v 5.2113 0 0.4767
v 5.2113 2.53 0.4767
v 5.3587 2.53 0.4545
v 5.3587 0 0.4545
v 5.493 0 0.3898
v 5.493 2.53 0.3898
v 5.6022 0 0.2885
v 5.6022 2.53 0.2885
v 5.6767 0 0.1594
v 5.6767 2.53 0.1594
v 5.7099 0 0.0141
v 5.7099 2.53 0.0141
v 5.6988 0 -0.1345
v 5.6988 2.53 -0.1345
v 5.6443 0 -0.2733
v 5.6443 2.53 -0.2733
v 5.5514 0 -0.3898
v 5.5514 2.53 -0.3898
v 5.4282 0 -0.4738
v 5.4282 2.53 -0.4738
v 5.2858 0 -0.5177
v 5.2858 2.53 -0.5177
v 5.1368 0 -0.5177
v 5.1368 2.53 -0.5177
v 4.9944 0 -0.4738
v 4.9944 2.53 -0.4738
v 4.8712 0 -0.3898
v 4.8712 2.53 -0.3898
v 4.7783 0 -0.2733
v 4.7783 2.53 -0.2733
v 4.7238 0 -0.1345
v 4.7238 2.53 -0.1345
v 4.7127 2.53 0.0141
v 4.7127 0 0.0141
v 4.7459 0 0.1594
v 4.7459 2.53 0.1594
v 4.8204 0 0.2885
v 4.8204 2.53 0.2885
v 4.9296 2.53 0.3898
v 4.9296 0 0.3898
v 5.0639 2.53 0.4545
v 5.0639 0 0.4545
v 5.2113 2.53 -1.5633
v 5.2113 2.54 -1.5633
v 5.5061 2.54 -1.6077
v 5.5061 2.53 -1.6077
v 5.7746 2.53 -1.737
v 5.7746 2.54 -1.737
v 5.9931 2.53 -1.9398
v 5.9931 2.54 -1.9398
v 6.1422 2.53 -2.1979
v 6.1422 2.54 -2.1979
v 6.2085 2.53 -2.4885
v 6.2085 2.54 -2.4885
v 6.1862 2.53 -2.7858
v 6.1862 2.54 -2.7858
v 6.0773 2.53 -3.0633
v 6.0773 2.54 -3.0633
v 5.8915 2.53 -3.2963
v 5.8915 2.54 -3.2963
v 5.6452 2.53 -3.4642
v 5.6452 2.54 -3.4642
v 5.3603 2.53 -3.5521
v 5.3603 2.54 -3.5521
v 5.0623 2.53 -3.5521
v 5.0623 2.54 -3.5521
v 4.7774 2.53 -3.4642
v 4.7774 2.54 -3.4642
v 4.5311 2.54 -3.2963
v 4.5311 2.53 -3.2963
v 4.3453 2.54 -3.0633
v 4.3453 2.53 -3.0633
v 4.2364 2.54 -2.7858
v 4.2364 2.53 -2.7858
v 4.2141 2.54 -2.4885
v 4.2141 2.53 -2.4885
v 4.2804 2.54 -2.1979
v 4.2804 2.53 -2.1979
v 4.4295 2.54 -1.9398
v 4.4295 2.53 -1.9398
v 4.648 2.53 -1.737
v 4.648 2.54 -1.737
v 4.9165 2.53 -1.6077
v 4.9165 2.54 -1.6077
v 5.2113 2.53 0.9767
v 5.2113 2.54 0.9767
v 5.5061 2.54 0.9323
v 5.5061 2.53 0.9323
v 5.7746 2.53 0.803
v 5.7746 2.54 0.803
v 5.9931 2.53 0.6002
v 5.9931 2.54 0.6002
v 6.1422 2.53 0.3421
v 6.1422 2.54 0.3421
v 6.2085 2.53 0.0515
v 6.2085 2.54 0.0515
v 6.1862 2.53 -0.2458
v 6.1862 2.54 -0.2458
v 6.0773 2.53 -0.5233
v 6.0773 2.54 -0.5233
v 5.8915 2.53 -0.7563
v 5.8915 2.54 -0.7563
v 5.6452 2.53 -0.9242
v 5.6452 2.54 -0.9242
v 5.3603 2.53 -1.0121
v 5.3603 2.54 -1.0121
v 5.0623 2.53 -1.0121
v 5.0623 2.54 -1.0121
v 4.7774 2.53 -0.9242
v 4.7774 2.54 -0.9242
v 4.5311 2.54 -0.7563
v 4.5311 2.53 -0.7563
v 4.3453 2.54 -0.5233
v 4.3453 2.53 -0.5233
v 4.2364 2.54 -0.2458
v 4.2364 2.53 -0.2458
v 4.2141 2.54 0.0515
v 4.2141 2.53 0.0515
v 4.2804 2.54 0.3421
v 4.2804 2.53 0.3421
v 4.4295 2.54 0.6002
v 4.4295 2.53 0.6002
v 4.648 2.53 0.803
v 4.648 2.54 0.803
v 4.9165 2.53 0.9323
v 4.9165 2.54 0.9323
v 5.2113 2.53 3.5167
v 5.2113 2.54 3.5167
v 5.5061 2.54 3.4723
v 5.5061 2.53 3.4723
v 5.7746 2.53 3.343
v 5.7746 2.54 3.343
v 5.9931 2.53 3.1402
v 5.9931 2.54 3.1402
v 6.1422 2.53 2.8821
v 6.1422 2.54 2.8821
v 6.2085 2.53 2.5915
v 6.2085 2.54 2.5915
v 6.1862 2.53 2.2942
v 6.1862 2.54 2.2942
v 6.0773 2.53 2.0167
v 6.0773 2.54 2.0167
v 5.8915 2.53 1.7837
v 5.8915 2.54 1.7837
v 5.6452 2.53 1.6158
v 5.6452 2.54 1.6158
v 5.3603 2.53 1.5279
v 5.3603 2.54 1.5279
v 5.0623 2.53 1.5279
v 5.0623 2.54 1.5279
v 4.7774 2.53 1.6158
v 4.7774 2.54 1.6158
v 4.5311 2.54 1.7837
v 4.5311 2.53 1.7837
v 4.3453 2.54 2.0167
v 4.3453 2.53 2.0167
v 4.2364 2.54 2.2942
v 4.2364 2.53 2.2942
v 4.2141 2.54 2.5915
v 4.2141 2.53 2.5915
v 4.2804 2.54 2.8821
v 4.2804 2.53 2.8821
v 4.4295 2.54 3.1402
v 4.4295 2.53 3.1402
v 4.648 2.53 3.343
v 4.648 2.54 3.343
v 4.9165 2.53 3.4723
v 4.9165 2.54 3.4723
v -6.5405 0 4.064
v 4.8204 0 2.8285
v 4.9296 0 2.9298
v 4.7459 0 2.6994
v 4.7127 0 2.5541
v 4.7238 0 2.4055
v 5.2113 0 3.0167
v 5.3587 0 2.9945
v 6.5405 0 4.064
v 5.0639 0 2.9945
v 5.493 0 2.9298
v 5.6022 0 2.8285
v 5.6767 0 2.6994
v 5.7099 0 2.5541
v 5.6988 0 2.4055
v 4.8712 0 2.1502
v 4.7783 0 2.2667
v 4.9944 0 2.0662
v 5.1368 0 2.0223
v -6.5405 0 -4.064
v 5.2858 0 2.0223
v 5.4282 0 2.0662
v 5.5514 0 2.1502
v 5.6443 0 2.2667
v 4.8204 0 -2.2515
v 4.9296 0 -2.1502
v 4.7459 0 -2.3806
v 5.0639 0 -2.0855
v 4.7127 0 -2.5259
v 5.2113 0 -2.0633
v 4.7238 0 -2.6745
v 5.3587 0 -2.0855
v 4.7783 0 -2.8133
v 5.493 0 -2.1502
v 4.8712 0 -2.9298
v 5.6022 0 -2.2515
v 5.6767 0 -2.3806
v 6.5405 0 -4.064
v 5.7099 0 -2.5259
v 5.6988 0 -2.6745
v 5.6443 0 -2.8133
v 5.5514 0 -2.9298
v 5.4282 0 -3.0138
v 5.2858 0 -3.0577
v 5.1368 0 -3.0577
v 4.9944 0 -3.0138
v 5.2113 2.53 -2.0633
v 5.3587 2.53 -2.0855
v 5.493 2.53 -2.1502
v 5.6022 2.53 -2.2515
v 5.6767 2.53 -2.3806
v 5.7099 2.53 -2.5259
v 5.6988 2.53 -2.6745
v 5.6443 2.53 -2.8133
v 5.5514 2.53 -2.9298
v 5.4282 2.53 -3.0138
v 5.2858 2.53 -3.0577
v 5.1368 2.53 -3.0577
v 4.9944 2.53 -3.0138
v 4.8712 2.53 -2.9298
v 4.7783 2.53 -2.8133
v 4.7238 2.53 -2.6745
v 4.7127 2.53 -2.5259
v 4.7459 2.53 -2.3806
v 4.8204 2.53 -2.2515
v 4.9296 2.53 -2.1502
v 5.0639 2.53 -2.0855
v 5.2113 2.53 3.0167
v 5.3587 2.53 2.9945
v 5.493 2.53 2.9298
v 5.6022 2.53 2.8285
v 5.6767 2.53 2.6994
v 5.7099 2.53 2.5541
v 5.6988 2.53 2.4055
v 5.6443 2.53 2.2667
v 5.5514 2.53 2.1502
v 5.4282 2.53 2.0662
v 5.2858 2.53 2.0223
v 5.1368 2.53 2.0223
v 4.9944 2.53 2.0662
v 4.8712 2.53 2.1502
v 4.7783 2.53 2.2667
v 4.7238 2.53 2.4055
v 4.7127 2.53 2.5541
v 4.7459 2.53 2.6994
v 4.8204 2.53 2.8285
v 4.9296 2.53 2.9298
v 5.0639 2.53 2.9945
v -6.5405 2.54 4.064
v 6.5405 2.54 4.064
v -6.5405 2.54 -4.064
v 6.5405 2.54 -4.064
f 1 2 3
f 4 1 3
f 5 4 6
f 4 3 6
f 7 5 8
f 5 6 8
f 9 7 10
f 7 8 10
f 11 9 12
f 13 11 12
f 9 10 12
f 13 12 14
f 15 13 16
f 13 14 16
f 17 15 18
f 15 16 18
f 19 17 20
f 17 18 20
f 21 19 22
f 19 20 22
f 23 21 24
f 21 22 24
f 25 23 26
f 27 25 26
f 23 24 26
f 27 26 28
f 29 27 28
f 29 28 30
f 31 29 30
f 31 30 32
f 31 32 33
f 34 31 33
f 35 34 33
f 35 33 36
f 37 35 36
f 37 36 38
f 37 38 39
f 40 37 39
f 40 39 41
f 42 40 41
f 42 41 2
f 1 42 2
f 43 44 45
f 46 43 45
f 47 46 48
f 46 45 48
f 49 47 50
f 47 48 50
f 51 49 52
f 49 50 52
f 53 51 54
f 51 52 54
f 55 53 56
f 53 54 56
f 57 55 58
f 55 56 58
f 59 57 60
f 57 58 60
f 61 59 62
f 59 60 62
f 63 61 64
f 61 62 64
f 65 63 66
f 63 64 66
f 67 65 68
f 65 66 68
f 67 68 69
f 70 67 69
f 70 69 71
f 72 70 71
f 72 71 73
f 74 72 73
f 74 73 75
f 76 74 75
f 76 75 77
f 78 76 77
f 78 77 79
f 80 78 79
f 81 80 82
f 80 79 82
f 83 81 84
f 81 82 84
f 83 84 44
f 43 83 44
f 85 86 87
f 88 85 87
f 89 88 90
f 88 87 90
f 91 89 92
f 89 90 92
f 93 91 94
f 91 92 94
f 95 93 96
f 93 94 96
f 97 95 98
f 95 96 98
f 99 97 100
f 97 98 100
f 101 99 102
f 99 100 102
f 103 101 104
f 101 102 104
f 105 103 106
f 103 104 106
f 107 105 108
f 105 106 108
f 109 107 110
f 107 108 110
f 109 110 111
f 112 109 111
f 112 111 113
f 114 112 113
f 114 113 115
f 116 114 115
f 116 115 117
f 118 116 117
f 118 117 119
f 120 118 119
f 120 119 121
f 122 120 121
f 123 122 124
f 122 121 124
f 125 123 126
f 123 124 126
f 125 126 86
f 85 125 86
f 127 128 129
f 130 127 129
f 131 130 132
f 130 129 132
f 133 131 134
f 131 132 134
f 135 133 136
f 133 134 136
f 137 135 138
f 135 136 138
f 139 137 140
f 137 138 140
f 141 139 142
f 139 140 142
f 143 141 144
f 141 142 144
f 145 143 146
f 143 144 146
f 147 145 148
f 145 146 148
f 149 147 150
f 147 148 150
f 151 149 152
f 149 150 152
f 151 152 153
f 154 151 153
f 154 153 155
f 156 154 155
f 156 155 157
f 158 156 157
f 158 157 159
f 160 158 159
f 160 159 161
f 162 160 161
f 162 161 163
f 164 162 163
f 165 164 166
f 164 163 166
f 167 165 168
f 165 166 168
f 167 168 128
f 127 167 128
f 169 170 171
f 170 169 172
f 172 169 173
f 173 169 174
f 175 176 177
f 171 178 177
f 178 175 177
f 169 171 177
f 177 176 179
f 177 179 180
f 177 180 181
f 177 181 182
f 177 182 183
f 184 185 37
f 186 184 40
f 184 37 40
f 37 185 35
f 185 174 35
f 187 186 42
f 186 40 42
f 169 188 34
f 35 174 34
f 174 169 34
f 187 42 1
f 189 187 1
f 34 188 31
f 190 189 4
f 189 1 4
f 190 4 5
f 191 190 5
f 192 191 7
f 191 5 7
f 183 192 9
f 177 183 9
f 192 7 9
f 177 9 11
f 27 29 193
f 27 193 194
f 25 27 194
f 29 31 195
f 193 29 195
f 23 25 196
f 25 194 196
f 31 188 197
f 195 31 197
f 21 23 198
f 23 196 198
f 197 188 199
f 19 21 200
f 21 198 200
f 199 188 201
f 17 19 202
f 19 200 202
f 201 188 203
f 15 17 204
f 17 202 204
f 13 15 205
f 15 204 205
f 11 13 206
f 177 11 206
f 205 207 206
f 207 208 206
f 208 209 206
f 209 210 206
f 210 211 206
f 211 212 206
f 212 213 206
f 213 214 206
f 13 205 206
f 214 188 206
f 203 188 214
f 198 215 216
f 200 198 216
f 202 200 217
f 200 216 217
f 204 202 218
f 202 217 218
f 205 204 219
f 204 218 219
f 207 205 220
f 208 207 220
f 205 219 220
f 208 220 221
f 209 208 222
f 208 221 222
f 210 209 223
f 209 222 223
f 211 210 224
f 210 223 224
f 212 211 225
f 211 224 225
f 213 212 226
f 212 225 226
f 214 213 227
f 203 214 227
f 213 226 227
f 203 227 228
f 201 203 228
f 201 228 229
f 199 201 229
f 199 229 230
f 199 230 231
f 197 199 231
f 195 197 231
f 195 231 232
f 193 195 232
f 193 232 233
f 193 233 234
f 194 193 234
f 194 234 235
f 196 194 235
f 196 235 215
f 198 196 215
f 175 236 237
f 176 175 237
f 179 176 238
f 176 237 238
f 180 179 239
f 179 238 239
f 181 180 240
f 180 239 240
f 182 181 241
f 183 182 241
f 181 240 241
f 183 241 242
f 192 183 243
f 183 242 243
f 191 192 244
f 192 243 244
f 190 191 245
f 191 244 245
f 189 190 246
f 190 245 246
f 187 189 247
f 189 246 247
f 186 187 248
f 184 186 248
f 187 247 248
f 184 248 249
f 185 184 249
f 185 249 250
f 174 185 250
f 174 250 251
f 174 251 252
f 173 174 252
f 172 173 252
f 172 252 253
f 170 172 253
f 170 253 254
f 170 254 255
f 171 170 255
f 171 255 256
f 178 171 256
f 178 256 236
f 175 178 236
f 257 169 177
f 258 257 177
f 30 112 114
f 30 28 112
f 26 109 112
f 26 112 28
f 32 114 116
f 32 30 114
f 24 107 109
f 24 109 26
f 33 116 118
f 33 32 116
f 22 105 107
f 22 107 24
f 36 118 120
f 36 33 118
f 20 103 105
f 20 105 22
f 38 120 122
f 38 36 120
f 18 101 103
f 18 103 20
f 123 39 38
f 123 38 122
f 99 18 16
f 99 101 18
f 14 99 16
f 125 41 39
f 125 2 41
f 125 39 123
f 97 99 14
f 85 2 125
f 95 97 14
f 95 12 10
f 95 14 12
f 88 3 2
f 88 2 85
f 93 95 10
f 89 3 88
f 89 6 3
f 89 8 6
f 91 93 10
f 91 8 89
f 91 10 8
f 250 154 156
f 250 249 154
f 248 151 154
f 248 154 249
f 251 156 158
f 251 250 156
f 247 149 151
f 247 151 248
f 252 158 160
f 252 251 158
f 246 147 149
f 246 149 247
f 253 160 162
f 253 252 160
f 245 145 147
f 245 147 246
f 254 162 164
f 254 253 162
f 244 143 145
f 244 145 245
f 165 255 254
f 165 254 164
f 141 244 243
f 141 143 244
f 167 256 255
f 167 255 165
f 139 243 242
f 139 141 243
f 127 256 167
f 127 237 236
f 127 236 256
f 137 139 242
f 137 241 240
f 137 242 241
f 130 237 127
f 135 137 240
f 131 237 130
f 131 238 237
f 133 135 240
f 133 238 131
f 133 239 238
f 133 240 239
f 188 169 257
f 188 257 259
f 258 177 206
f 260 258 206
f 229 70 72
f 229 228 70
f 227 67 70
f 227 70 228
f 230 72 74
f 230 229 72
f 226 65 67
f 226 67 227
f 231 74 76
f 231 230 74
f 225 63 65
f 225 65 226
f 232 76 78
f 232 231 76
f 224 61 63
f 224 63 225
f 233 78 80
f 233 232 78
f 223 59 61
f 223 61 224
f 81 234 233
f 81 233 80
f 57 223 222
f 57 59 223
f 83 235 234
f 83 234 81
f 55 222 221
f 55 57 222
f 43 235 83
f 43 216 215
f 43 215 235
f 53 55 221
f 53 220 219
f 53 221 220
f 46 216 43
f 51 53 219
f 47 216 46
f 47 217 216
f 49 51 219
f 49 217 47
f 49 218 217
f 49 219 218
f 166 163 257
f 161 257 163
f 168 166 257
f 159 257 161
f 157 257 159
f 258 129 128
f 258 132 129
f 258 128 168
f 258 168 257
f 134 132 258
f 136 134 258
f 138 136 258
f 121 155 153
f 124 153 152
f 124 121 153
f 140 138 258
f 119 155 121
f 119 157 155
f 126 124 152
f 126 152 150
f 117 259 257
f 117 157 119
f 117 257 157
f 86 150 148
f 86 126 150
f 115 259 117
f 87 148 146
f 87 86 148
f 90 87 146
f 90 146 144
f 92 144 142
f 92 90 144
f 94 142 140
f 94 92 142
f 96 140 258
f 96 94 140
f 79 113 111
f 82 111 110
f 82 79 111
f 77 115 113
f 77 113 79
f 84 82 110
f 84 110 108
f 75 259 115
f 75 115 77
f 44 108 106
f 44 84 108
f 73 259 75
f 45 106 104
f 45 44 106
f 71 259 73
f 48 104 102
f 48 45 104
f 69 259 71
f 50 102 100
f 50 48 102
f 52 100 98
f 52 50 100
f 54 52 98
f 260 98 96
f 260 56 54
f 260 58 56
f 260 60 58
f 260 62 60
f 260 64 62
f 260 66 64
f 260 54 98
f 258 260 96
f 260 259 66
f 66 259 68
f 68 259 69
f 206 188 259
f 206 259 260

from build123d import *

# Parameters (mm, degrees)
SKETCH1_W           = 13.081
SKETCH1_H           = 8.128
BOSS_EXTRUDE1_DEPTH = 2.54
SKETCH2_R           = 0.5
CUT_EXTRUDE1_DEPTH  = 9.108380618
SKETCH3_R           = 1
CUT_EXTRUDE2_DEPTH  = 0.01


with BuildPart() as part:
    # Sketch1 → Boss-Extrude1 (new body)
    with BuildSketch(Plane(origin=(0, 0, 0), x_dir=(1, 0, 0), z_dir=(0, 1, 0))):
        Rectangle(SKETCH1_W, SKETCH1_H)
    extrude(amount=BOSS_EXTRUDE1_DEPTH)

    # Sketch2 → Cut-Extrude1 (cut, through all)
    with BuildSketch(Plane(origin=(0, 2.54, 0), x_dir=(1, 0, 0), z_dir=(0, 1, 0))):
        with Locations(Location((5.211297807, 2.563271845, 0), (0, 0, 270))):
            Circle(SKETCH2_R)
        with Locations(Location((5.211297807, 0.023271845, 0), (0, 0, 270))):
            Circle(SKETCH2_R)
        with Locations(Location((5.211297807, -2.516728155, 0), (0, 0, 270))):
            Circle(SKETCH2_R)
    extrude(amount=-CUT_EXTRUDE1_DEPTH, mode=Mode.SUBTRACT)

    # Sketch3 → Cut-Extrude2 (cut)
    with BuildSketch(Plane(origin=(0, 2.54, 0), x_dir=(1, 0, 0), z_dir=(0, 1, 0))):
        with Locations(Location((5.211297807, 2.563271845, 0), (0, 0, 270))):
            Circle(SKETCH3_R)
        with Locations(Location((5.211297807, 0.023271845, 0), (0, 0, 270))):
            Circle(SKETCH3_R)
        with Locations(Location((5.211297807, -2.516728155, 0), (0, 0, 270))):
            Circle(SKETCH3_R)
    extrude(amount=-CUT_EXTRUDE2_DEPTH, mode=Mode.SUBTRACT)


solid = part.part
